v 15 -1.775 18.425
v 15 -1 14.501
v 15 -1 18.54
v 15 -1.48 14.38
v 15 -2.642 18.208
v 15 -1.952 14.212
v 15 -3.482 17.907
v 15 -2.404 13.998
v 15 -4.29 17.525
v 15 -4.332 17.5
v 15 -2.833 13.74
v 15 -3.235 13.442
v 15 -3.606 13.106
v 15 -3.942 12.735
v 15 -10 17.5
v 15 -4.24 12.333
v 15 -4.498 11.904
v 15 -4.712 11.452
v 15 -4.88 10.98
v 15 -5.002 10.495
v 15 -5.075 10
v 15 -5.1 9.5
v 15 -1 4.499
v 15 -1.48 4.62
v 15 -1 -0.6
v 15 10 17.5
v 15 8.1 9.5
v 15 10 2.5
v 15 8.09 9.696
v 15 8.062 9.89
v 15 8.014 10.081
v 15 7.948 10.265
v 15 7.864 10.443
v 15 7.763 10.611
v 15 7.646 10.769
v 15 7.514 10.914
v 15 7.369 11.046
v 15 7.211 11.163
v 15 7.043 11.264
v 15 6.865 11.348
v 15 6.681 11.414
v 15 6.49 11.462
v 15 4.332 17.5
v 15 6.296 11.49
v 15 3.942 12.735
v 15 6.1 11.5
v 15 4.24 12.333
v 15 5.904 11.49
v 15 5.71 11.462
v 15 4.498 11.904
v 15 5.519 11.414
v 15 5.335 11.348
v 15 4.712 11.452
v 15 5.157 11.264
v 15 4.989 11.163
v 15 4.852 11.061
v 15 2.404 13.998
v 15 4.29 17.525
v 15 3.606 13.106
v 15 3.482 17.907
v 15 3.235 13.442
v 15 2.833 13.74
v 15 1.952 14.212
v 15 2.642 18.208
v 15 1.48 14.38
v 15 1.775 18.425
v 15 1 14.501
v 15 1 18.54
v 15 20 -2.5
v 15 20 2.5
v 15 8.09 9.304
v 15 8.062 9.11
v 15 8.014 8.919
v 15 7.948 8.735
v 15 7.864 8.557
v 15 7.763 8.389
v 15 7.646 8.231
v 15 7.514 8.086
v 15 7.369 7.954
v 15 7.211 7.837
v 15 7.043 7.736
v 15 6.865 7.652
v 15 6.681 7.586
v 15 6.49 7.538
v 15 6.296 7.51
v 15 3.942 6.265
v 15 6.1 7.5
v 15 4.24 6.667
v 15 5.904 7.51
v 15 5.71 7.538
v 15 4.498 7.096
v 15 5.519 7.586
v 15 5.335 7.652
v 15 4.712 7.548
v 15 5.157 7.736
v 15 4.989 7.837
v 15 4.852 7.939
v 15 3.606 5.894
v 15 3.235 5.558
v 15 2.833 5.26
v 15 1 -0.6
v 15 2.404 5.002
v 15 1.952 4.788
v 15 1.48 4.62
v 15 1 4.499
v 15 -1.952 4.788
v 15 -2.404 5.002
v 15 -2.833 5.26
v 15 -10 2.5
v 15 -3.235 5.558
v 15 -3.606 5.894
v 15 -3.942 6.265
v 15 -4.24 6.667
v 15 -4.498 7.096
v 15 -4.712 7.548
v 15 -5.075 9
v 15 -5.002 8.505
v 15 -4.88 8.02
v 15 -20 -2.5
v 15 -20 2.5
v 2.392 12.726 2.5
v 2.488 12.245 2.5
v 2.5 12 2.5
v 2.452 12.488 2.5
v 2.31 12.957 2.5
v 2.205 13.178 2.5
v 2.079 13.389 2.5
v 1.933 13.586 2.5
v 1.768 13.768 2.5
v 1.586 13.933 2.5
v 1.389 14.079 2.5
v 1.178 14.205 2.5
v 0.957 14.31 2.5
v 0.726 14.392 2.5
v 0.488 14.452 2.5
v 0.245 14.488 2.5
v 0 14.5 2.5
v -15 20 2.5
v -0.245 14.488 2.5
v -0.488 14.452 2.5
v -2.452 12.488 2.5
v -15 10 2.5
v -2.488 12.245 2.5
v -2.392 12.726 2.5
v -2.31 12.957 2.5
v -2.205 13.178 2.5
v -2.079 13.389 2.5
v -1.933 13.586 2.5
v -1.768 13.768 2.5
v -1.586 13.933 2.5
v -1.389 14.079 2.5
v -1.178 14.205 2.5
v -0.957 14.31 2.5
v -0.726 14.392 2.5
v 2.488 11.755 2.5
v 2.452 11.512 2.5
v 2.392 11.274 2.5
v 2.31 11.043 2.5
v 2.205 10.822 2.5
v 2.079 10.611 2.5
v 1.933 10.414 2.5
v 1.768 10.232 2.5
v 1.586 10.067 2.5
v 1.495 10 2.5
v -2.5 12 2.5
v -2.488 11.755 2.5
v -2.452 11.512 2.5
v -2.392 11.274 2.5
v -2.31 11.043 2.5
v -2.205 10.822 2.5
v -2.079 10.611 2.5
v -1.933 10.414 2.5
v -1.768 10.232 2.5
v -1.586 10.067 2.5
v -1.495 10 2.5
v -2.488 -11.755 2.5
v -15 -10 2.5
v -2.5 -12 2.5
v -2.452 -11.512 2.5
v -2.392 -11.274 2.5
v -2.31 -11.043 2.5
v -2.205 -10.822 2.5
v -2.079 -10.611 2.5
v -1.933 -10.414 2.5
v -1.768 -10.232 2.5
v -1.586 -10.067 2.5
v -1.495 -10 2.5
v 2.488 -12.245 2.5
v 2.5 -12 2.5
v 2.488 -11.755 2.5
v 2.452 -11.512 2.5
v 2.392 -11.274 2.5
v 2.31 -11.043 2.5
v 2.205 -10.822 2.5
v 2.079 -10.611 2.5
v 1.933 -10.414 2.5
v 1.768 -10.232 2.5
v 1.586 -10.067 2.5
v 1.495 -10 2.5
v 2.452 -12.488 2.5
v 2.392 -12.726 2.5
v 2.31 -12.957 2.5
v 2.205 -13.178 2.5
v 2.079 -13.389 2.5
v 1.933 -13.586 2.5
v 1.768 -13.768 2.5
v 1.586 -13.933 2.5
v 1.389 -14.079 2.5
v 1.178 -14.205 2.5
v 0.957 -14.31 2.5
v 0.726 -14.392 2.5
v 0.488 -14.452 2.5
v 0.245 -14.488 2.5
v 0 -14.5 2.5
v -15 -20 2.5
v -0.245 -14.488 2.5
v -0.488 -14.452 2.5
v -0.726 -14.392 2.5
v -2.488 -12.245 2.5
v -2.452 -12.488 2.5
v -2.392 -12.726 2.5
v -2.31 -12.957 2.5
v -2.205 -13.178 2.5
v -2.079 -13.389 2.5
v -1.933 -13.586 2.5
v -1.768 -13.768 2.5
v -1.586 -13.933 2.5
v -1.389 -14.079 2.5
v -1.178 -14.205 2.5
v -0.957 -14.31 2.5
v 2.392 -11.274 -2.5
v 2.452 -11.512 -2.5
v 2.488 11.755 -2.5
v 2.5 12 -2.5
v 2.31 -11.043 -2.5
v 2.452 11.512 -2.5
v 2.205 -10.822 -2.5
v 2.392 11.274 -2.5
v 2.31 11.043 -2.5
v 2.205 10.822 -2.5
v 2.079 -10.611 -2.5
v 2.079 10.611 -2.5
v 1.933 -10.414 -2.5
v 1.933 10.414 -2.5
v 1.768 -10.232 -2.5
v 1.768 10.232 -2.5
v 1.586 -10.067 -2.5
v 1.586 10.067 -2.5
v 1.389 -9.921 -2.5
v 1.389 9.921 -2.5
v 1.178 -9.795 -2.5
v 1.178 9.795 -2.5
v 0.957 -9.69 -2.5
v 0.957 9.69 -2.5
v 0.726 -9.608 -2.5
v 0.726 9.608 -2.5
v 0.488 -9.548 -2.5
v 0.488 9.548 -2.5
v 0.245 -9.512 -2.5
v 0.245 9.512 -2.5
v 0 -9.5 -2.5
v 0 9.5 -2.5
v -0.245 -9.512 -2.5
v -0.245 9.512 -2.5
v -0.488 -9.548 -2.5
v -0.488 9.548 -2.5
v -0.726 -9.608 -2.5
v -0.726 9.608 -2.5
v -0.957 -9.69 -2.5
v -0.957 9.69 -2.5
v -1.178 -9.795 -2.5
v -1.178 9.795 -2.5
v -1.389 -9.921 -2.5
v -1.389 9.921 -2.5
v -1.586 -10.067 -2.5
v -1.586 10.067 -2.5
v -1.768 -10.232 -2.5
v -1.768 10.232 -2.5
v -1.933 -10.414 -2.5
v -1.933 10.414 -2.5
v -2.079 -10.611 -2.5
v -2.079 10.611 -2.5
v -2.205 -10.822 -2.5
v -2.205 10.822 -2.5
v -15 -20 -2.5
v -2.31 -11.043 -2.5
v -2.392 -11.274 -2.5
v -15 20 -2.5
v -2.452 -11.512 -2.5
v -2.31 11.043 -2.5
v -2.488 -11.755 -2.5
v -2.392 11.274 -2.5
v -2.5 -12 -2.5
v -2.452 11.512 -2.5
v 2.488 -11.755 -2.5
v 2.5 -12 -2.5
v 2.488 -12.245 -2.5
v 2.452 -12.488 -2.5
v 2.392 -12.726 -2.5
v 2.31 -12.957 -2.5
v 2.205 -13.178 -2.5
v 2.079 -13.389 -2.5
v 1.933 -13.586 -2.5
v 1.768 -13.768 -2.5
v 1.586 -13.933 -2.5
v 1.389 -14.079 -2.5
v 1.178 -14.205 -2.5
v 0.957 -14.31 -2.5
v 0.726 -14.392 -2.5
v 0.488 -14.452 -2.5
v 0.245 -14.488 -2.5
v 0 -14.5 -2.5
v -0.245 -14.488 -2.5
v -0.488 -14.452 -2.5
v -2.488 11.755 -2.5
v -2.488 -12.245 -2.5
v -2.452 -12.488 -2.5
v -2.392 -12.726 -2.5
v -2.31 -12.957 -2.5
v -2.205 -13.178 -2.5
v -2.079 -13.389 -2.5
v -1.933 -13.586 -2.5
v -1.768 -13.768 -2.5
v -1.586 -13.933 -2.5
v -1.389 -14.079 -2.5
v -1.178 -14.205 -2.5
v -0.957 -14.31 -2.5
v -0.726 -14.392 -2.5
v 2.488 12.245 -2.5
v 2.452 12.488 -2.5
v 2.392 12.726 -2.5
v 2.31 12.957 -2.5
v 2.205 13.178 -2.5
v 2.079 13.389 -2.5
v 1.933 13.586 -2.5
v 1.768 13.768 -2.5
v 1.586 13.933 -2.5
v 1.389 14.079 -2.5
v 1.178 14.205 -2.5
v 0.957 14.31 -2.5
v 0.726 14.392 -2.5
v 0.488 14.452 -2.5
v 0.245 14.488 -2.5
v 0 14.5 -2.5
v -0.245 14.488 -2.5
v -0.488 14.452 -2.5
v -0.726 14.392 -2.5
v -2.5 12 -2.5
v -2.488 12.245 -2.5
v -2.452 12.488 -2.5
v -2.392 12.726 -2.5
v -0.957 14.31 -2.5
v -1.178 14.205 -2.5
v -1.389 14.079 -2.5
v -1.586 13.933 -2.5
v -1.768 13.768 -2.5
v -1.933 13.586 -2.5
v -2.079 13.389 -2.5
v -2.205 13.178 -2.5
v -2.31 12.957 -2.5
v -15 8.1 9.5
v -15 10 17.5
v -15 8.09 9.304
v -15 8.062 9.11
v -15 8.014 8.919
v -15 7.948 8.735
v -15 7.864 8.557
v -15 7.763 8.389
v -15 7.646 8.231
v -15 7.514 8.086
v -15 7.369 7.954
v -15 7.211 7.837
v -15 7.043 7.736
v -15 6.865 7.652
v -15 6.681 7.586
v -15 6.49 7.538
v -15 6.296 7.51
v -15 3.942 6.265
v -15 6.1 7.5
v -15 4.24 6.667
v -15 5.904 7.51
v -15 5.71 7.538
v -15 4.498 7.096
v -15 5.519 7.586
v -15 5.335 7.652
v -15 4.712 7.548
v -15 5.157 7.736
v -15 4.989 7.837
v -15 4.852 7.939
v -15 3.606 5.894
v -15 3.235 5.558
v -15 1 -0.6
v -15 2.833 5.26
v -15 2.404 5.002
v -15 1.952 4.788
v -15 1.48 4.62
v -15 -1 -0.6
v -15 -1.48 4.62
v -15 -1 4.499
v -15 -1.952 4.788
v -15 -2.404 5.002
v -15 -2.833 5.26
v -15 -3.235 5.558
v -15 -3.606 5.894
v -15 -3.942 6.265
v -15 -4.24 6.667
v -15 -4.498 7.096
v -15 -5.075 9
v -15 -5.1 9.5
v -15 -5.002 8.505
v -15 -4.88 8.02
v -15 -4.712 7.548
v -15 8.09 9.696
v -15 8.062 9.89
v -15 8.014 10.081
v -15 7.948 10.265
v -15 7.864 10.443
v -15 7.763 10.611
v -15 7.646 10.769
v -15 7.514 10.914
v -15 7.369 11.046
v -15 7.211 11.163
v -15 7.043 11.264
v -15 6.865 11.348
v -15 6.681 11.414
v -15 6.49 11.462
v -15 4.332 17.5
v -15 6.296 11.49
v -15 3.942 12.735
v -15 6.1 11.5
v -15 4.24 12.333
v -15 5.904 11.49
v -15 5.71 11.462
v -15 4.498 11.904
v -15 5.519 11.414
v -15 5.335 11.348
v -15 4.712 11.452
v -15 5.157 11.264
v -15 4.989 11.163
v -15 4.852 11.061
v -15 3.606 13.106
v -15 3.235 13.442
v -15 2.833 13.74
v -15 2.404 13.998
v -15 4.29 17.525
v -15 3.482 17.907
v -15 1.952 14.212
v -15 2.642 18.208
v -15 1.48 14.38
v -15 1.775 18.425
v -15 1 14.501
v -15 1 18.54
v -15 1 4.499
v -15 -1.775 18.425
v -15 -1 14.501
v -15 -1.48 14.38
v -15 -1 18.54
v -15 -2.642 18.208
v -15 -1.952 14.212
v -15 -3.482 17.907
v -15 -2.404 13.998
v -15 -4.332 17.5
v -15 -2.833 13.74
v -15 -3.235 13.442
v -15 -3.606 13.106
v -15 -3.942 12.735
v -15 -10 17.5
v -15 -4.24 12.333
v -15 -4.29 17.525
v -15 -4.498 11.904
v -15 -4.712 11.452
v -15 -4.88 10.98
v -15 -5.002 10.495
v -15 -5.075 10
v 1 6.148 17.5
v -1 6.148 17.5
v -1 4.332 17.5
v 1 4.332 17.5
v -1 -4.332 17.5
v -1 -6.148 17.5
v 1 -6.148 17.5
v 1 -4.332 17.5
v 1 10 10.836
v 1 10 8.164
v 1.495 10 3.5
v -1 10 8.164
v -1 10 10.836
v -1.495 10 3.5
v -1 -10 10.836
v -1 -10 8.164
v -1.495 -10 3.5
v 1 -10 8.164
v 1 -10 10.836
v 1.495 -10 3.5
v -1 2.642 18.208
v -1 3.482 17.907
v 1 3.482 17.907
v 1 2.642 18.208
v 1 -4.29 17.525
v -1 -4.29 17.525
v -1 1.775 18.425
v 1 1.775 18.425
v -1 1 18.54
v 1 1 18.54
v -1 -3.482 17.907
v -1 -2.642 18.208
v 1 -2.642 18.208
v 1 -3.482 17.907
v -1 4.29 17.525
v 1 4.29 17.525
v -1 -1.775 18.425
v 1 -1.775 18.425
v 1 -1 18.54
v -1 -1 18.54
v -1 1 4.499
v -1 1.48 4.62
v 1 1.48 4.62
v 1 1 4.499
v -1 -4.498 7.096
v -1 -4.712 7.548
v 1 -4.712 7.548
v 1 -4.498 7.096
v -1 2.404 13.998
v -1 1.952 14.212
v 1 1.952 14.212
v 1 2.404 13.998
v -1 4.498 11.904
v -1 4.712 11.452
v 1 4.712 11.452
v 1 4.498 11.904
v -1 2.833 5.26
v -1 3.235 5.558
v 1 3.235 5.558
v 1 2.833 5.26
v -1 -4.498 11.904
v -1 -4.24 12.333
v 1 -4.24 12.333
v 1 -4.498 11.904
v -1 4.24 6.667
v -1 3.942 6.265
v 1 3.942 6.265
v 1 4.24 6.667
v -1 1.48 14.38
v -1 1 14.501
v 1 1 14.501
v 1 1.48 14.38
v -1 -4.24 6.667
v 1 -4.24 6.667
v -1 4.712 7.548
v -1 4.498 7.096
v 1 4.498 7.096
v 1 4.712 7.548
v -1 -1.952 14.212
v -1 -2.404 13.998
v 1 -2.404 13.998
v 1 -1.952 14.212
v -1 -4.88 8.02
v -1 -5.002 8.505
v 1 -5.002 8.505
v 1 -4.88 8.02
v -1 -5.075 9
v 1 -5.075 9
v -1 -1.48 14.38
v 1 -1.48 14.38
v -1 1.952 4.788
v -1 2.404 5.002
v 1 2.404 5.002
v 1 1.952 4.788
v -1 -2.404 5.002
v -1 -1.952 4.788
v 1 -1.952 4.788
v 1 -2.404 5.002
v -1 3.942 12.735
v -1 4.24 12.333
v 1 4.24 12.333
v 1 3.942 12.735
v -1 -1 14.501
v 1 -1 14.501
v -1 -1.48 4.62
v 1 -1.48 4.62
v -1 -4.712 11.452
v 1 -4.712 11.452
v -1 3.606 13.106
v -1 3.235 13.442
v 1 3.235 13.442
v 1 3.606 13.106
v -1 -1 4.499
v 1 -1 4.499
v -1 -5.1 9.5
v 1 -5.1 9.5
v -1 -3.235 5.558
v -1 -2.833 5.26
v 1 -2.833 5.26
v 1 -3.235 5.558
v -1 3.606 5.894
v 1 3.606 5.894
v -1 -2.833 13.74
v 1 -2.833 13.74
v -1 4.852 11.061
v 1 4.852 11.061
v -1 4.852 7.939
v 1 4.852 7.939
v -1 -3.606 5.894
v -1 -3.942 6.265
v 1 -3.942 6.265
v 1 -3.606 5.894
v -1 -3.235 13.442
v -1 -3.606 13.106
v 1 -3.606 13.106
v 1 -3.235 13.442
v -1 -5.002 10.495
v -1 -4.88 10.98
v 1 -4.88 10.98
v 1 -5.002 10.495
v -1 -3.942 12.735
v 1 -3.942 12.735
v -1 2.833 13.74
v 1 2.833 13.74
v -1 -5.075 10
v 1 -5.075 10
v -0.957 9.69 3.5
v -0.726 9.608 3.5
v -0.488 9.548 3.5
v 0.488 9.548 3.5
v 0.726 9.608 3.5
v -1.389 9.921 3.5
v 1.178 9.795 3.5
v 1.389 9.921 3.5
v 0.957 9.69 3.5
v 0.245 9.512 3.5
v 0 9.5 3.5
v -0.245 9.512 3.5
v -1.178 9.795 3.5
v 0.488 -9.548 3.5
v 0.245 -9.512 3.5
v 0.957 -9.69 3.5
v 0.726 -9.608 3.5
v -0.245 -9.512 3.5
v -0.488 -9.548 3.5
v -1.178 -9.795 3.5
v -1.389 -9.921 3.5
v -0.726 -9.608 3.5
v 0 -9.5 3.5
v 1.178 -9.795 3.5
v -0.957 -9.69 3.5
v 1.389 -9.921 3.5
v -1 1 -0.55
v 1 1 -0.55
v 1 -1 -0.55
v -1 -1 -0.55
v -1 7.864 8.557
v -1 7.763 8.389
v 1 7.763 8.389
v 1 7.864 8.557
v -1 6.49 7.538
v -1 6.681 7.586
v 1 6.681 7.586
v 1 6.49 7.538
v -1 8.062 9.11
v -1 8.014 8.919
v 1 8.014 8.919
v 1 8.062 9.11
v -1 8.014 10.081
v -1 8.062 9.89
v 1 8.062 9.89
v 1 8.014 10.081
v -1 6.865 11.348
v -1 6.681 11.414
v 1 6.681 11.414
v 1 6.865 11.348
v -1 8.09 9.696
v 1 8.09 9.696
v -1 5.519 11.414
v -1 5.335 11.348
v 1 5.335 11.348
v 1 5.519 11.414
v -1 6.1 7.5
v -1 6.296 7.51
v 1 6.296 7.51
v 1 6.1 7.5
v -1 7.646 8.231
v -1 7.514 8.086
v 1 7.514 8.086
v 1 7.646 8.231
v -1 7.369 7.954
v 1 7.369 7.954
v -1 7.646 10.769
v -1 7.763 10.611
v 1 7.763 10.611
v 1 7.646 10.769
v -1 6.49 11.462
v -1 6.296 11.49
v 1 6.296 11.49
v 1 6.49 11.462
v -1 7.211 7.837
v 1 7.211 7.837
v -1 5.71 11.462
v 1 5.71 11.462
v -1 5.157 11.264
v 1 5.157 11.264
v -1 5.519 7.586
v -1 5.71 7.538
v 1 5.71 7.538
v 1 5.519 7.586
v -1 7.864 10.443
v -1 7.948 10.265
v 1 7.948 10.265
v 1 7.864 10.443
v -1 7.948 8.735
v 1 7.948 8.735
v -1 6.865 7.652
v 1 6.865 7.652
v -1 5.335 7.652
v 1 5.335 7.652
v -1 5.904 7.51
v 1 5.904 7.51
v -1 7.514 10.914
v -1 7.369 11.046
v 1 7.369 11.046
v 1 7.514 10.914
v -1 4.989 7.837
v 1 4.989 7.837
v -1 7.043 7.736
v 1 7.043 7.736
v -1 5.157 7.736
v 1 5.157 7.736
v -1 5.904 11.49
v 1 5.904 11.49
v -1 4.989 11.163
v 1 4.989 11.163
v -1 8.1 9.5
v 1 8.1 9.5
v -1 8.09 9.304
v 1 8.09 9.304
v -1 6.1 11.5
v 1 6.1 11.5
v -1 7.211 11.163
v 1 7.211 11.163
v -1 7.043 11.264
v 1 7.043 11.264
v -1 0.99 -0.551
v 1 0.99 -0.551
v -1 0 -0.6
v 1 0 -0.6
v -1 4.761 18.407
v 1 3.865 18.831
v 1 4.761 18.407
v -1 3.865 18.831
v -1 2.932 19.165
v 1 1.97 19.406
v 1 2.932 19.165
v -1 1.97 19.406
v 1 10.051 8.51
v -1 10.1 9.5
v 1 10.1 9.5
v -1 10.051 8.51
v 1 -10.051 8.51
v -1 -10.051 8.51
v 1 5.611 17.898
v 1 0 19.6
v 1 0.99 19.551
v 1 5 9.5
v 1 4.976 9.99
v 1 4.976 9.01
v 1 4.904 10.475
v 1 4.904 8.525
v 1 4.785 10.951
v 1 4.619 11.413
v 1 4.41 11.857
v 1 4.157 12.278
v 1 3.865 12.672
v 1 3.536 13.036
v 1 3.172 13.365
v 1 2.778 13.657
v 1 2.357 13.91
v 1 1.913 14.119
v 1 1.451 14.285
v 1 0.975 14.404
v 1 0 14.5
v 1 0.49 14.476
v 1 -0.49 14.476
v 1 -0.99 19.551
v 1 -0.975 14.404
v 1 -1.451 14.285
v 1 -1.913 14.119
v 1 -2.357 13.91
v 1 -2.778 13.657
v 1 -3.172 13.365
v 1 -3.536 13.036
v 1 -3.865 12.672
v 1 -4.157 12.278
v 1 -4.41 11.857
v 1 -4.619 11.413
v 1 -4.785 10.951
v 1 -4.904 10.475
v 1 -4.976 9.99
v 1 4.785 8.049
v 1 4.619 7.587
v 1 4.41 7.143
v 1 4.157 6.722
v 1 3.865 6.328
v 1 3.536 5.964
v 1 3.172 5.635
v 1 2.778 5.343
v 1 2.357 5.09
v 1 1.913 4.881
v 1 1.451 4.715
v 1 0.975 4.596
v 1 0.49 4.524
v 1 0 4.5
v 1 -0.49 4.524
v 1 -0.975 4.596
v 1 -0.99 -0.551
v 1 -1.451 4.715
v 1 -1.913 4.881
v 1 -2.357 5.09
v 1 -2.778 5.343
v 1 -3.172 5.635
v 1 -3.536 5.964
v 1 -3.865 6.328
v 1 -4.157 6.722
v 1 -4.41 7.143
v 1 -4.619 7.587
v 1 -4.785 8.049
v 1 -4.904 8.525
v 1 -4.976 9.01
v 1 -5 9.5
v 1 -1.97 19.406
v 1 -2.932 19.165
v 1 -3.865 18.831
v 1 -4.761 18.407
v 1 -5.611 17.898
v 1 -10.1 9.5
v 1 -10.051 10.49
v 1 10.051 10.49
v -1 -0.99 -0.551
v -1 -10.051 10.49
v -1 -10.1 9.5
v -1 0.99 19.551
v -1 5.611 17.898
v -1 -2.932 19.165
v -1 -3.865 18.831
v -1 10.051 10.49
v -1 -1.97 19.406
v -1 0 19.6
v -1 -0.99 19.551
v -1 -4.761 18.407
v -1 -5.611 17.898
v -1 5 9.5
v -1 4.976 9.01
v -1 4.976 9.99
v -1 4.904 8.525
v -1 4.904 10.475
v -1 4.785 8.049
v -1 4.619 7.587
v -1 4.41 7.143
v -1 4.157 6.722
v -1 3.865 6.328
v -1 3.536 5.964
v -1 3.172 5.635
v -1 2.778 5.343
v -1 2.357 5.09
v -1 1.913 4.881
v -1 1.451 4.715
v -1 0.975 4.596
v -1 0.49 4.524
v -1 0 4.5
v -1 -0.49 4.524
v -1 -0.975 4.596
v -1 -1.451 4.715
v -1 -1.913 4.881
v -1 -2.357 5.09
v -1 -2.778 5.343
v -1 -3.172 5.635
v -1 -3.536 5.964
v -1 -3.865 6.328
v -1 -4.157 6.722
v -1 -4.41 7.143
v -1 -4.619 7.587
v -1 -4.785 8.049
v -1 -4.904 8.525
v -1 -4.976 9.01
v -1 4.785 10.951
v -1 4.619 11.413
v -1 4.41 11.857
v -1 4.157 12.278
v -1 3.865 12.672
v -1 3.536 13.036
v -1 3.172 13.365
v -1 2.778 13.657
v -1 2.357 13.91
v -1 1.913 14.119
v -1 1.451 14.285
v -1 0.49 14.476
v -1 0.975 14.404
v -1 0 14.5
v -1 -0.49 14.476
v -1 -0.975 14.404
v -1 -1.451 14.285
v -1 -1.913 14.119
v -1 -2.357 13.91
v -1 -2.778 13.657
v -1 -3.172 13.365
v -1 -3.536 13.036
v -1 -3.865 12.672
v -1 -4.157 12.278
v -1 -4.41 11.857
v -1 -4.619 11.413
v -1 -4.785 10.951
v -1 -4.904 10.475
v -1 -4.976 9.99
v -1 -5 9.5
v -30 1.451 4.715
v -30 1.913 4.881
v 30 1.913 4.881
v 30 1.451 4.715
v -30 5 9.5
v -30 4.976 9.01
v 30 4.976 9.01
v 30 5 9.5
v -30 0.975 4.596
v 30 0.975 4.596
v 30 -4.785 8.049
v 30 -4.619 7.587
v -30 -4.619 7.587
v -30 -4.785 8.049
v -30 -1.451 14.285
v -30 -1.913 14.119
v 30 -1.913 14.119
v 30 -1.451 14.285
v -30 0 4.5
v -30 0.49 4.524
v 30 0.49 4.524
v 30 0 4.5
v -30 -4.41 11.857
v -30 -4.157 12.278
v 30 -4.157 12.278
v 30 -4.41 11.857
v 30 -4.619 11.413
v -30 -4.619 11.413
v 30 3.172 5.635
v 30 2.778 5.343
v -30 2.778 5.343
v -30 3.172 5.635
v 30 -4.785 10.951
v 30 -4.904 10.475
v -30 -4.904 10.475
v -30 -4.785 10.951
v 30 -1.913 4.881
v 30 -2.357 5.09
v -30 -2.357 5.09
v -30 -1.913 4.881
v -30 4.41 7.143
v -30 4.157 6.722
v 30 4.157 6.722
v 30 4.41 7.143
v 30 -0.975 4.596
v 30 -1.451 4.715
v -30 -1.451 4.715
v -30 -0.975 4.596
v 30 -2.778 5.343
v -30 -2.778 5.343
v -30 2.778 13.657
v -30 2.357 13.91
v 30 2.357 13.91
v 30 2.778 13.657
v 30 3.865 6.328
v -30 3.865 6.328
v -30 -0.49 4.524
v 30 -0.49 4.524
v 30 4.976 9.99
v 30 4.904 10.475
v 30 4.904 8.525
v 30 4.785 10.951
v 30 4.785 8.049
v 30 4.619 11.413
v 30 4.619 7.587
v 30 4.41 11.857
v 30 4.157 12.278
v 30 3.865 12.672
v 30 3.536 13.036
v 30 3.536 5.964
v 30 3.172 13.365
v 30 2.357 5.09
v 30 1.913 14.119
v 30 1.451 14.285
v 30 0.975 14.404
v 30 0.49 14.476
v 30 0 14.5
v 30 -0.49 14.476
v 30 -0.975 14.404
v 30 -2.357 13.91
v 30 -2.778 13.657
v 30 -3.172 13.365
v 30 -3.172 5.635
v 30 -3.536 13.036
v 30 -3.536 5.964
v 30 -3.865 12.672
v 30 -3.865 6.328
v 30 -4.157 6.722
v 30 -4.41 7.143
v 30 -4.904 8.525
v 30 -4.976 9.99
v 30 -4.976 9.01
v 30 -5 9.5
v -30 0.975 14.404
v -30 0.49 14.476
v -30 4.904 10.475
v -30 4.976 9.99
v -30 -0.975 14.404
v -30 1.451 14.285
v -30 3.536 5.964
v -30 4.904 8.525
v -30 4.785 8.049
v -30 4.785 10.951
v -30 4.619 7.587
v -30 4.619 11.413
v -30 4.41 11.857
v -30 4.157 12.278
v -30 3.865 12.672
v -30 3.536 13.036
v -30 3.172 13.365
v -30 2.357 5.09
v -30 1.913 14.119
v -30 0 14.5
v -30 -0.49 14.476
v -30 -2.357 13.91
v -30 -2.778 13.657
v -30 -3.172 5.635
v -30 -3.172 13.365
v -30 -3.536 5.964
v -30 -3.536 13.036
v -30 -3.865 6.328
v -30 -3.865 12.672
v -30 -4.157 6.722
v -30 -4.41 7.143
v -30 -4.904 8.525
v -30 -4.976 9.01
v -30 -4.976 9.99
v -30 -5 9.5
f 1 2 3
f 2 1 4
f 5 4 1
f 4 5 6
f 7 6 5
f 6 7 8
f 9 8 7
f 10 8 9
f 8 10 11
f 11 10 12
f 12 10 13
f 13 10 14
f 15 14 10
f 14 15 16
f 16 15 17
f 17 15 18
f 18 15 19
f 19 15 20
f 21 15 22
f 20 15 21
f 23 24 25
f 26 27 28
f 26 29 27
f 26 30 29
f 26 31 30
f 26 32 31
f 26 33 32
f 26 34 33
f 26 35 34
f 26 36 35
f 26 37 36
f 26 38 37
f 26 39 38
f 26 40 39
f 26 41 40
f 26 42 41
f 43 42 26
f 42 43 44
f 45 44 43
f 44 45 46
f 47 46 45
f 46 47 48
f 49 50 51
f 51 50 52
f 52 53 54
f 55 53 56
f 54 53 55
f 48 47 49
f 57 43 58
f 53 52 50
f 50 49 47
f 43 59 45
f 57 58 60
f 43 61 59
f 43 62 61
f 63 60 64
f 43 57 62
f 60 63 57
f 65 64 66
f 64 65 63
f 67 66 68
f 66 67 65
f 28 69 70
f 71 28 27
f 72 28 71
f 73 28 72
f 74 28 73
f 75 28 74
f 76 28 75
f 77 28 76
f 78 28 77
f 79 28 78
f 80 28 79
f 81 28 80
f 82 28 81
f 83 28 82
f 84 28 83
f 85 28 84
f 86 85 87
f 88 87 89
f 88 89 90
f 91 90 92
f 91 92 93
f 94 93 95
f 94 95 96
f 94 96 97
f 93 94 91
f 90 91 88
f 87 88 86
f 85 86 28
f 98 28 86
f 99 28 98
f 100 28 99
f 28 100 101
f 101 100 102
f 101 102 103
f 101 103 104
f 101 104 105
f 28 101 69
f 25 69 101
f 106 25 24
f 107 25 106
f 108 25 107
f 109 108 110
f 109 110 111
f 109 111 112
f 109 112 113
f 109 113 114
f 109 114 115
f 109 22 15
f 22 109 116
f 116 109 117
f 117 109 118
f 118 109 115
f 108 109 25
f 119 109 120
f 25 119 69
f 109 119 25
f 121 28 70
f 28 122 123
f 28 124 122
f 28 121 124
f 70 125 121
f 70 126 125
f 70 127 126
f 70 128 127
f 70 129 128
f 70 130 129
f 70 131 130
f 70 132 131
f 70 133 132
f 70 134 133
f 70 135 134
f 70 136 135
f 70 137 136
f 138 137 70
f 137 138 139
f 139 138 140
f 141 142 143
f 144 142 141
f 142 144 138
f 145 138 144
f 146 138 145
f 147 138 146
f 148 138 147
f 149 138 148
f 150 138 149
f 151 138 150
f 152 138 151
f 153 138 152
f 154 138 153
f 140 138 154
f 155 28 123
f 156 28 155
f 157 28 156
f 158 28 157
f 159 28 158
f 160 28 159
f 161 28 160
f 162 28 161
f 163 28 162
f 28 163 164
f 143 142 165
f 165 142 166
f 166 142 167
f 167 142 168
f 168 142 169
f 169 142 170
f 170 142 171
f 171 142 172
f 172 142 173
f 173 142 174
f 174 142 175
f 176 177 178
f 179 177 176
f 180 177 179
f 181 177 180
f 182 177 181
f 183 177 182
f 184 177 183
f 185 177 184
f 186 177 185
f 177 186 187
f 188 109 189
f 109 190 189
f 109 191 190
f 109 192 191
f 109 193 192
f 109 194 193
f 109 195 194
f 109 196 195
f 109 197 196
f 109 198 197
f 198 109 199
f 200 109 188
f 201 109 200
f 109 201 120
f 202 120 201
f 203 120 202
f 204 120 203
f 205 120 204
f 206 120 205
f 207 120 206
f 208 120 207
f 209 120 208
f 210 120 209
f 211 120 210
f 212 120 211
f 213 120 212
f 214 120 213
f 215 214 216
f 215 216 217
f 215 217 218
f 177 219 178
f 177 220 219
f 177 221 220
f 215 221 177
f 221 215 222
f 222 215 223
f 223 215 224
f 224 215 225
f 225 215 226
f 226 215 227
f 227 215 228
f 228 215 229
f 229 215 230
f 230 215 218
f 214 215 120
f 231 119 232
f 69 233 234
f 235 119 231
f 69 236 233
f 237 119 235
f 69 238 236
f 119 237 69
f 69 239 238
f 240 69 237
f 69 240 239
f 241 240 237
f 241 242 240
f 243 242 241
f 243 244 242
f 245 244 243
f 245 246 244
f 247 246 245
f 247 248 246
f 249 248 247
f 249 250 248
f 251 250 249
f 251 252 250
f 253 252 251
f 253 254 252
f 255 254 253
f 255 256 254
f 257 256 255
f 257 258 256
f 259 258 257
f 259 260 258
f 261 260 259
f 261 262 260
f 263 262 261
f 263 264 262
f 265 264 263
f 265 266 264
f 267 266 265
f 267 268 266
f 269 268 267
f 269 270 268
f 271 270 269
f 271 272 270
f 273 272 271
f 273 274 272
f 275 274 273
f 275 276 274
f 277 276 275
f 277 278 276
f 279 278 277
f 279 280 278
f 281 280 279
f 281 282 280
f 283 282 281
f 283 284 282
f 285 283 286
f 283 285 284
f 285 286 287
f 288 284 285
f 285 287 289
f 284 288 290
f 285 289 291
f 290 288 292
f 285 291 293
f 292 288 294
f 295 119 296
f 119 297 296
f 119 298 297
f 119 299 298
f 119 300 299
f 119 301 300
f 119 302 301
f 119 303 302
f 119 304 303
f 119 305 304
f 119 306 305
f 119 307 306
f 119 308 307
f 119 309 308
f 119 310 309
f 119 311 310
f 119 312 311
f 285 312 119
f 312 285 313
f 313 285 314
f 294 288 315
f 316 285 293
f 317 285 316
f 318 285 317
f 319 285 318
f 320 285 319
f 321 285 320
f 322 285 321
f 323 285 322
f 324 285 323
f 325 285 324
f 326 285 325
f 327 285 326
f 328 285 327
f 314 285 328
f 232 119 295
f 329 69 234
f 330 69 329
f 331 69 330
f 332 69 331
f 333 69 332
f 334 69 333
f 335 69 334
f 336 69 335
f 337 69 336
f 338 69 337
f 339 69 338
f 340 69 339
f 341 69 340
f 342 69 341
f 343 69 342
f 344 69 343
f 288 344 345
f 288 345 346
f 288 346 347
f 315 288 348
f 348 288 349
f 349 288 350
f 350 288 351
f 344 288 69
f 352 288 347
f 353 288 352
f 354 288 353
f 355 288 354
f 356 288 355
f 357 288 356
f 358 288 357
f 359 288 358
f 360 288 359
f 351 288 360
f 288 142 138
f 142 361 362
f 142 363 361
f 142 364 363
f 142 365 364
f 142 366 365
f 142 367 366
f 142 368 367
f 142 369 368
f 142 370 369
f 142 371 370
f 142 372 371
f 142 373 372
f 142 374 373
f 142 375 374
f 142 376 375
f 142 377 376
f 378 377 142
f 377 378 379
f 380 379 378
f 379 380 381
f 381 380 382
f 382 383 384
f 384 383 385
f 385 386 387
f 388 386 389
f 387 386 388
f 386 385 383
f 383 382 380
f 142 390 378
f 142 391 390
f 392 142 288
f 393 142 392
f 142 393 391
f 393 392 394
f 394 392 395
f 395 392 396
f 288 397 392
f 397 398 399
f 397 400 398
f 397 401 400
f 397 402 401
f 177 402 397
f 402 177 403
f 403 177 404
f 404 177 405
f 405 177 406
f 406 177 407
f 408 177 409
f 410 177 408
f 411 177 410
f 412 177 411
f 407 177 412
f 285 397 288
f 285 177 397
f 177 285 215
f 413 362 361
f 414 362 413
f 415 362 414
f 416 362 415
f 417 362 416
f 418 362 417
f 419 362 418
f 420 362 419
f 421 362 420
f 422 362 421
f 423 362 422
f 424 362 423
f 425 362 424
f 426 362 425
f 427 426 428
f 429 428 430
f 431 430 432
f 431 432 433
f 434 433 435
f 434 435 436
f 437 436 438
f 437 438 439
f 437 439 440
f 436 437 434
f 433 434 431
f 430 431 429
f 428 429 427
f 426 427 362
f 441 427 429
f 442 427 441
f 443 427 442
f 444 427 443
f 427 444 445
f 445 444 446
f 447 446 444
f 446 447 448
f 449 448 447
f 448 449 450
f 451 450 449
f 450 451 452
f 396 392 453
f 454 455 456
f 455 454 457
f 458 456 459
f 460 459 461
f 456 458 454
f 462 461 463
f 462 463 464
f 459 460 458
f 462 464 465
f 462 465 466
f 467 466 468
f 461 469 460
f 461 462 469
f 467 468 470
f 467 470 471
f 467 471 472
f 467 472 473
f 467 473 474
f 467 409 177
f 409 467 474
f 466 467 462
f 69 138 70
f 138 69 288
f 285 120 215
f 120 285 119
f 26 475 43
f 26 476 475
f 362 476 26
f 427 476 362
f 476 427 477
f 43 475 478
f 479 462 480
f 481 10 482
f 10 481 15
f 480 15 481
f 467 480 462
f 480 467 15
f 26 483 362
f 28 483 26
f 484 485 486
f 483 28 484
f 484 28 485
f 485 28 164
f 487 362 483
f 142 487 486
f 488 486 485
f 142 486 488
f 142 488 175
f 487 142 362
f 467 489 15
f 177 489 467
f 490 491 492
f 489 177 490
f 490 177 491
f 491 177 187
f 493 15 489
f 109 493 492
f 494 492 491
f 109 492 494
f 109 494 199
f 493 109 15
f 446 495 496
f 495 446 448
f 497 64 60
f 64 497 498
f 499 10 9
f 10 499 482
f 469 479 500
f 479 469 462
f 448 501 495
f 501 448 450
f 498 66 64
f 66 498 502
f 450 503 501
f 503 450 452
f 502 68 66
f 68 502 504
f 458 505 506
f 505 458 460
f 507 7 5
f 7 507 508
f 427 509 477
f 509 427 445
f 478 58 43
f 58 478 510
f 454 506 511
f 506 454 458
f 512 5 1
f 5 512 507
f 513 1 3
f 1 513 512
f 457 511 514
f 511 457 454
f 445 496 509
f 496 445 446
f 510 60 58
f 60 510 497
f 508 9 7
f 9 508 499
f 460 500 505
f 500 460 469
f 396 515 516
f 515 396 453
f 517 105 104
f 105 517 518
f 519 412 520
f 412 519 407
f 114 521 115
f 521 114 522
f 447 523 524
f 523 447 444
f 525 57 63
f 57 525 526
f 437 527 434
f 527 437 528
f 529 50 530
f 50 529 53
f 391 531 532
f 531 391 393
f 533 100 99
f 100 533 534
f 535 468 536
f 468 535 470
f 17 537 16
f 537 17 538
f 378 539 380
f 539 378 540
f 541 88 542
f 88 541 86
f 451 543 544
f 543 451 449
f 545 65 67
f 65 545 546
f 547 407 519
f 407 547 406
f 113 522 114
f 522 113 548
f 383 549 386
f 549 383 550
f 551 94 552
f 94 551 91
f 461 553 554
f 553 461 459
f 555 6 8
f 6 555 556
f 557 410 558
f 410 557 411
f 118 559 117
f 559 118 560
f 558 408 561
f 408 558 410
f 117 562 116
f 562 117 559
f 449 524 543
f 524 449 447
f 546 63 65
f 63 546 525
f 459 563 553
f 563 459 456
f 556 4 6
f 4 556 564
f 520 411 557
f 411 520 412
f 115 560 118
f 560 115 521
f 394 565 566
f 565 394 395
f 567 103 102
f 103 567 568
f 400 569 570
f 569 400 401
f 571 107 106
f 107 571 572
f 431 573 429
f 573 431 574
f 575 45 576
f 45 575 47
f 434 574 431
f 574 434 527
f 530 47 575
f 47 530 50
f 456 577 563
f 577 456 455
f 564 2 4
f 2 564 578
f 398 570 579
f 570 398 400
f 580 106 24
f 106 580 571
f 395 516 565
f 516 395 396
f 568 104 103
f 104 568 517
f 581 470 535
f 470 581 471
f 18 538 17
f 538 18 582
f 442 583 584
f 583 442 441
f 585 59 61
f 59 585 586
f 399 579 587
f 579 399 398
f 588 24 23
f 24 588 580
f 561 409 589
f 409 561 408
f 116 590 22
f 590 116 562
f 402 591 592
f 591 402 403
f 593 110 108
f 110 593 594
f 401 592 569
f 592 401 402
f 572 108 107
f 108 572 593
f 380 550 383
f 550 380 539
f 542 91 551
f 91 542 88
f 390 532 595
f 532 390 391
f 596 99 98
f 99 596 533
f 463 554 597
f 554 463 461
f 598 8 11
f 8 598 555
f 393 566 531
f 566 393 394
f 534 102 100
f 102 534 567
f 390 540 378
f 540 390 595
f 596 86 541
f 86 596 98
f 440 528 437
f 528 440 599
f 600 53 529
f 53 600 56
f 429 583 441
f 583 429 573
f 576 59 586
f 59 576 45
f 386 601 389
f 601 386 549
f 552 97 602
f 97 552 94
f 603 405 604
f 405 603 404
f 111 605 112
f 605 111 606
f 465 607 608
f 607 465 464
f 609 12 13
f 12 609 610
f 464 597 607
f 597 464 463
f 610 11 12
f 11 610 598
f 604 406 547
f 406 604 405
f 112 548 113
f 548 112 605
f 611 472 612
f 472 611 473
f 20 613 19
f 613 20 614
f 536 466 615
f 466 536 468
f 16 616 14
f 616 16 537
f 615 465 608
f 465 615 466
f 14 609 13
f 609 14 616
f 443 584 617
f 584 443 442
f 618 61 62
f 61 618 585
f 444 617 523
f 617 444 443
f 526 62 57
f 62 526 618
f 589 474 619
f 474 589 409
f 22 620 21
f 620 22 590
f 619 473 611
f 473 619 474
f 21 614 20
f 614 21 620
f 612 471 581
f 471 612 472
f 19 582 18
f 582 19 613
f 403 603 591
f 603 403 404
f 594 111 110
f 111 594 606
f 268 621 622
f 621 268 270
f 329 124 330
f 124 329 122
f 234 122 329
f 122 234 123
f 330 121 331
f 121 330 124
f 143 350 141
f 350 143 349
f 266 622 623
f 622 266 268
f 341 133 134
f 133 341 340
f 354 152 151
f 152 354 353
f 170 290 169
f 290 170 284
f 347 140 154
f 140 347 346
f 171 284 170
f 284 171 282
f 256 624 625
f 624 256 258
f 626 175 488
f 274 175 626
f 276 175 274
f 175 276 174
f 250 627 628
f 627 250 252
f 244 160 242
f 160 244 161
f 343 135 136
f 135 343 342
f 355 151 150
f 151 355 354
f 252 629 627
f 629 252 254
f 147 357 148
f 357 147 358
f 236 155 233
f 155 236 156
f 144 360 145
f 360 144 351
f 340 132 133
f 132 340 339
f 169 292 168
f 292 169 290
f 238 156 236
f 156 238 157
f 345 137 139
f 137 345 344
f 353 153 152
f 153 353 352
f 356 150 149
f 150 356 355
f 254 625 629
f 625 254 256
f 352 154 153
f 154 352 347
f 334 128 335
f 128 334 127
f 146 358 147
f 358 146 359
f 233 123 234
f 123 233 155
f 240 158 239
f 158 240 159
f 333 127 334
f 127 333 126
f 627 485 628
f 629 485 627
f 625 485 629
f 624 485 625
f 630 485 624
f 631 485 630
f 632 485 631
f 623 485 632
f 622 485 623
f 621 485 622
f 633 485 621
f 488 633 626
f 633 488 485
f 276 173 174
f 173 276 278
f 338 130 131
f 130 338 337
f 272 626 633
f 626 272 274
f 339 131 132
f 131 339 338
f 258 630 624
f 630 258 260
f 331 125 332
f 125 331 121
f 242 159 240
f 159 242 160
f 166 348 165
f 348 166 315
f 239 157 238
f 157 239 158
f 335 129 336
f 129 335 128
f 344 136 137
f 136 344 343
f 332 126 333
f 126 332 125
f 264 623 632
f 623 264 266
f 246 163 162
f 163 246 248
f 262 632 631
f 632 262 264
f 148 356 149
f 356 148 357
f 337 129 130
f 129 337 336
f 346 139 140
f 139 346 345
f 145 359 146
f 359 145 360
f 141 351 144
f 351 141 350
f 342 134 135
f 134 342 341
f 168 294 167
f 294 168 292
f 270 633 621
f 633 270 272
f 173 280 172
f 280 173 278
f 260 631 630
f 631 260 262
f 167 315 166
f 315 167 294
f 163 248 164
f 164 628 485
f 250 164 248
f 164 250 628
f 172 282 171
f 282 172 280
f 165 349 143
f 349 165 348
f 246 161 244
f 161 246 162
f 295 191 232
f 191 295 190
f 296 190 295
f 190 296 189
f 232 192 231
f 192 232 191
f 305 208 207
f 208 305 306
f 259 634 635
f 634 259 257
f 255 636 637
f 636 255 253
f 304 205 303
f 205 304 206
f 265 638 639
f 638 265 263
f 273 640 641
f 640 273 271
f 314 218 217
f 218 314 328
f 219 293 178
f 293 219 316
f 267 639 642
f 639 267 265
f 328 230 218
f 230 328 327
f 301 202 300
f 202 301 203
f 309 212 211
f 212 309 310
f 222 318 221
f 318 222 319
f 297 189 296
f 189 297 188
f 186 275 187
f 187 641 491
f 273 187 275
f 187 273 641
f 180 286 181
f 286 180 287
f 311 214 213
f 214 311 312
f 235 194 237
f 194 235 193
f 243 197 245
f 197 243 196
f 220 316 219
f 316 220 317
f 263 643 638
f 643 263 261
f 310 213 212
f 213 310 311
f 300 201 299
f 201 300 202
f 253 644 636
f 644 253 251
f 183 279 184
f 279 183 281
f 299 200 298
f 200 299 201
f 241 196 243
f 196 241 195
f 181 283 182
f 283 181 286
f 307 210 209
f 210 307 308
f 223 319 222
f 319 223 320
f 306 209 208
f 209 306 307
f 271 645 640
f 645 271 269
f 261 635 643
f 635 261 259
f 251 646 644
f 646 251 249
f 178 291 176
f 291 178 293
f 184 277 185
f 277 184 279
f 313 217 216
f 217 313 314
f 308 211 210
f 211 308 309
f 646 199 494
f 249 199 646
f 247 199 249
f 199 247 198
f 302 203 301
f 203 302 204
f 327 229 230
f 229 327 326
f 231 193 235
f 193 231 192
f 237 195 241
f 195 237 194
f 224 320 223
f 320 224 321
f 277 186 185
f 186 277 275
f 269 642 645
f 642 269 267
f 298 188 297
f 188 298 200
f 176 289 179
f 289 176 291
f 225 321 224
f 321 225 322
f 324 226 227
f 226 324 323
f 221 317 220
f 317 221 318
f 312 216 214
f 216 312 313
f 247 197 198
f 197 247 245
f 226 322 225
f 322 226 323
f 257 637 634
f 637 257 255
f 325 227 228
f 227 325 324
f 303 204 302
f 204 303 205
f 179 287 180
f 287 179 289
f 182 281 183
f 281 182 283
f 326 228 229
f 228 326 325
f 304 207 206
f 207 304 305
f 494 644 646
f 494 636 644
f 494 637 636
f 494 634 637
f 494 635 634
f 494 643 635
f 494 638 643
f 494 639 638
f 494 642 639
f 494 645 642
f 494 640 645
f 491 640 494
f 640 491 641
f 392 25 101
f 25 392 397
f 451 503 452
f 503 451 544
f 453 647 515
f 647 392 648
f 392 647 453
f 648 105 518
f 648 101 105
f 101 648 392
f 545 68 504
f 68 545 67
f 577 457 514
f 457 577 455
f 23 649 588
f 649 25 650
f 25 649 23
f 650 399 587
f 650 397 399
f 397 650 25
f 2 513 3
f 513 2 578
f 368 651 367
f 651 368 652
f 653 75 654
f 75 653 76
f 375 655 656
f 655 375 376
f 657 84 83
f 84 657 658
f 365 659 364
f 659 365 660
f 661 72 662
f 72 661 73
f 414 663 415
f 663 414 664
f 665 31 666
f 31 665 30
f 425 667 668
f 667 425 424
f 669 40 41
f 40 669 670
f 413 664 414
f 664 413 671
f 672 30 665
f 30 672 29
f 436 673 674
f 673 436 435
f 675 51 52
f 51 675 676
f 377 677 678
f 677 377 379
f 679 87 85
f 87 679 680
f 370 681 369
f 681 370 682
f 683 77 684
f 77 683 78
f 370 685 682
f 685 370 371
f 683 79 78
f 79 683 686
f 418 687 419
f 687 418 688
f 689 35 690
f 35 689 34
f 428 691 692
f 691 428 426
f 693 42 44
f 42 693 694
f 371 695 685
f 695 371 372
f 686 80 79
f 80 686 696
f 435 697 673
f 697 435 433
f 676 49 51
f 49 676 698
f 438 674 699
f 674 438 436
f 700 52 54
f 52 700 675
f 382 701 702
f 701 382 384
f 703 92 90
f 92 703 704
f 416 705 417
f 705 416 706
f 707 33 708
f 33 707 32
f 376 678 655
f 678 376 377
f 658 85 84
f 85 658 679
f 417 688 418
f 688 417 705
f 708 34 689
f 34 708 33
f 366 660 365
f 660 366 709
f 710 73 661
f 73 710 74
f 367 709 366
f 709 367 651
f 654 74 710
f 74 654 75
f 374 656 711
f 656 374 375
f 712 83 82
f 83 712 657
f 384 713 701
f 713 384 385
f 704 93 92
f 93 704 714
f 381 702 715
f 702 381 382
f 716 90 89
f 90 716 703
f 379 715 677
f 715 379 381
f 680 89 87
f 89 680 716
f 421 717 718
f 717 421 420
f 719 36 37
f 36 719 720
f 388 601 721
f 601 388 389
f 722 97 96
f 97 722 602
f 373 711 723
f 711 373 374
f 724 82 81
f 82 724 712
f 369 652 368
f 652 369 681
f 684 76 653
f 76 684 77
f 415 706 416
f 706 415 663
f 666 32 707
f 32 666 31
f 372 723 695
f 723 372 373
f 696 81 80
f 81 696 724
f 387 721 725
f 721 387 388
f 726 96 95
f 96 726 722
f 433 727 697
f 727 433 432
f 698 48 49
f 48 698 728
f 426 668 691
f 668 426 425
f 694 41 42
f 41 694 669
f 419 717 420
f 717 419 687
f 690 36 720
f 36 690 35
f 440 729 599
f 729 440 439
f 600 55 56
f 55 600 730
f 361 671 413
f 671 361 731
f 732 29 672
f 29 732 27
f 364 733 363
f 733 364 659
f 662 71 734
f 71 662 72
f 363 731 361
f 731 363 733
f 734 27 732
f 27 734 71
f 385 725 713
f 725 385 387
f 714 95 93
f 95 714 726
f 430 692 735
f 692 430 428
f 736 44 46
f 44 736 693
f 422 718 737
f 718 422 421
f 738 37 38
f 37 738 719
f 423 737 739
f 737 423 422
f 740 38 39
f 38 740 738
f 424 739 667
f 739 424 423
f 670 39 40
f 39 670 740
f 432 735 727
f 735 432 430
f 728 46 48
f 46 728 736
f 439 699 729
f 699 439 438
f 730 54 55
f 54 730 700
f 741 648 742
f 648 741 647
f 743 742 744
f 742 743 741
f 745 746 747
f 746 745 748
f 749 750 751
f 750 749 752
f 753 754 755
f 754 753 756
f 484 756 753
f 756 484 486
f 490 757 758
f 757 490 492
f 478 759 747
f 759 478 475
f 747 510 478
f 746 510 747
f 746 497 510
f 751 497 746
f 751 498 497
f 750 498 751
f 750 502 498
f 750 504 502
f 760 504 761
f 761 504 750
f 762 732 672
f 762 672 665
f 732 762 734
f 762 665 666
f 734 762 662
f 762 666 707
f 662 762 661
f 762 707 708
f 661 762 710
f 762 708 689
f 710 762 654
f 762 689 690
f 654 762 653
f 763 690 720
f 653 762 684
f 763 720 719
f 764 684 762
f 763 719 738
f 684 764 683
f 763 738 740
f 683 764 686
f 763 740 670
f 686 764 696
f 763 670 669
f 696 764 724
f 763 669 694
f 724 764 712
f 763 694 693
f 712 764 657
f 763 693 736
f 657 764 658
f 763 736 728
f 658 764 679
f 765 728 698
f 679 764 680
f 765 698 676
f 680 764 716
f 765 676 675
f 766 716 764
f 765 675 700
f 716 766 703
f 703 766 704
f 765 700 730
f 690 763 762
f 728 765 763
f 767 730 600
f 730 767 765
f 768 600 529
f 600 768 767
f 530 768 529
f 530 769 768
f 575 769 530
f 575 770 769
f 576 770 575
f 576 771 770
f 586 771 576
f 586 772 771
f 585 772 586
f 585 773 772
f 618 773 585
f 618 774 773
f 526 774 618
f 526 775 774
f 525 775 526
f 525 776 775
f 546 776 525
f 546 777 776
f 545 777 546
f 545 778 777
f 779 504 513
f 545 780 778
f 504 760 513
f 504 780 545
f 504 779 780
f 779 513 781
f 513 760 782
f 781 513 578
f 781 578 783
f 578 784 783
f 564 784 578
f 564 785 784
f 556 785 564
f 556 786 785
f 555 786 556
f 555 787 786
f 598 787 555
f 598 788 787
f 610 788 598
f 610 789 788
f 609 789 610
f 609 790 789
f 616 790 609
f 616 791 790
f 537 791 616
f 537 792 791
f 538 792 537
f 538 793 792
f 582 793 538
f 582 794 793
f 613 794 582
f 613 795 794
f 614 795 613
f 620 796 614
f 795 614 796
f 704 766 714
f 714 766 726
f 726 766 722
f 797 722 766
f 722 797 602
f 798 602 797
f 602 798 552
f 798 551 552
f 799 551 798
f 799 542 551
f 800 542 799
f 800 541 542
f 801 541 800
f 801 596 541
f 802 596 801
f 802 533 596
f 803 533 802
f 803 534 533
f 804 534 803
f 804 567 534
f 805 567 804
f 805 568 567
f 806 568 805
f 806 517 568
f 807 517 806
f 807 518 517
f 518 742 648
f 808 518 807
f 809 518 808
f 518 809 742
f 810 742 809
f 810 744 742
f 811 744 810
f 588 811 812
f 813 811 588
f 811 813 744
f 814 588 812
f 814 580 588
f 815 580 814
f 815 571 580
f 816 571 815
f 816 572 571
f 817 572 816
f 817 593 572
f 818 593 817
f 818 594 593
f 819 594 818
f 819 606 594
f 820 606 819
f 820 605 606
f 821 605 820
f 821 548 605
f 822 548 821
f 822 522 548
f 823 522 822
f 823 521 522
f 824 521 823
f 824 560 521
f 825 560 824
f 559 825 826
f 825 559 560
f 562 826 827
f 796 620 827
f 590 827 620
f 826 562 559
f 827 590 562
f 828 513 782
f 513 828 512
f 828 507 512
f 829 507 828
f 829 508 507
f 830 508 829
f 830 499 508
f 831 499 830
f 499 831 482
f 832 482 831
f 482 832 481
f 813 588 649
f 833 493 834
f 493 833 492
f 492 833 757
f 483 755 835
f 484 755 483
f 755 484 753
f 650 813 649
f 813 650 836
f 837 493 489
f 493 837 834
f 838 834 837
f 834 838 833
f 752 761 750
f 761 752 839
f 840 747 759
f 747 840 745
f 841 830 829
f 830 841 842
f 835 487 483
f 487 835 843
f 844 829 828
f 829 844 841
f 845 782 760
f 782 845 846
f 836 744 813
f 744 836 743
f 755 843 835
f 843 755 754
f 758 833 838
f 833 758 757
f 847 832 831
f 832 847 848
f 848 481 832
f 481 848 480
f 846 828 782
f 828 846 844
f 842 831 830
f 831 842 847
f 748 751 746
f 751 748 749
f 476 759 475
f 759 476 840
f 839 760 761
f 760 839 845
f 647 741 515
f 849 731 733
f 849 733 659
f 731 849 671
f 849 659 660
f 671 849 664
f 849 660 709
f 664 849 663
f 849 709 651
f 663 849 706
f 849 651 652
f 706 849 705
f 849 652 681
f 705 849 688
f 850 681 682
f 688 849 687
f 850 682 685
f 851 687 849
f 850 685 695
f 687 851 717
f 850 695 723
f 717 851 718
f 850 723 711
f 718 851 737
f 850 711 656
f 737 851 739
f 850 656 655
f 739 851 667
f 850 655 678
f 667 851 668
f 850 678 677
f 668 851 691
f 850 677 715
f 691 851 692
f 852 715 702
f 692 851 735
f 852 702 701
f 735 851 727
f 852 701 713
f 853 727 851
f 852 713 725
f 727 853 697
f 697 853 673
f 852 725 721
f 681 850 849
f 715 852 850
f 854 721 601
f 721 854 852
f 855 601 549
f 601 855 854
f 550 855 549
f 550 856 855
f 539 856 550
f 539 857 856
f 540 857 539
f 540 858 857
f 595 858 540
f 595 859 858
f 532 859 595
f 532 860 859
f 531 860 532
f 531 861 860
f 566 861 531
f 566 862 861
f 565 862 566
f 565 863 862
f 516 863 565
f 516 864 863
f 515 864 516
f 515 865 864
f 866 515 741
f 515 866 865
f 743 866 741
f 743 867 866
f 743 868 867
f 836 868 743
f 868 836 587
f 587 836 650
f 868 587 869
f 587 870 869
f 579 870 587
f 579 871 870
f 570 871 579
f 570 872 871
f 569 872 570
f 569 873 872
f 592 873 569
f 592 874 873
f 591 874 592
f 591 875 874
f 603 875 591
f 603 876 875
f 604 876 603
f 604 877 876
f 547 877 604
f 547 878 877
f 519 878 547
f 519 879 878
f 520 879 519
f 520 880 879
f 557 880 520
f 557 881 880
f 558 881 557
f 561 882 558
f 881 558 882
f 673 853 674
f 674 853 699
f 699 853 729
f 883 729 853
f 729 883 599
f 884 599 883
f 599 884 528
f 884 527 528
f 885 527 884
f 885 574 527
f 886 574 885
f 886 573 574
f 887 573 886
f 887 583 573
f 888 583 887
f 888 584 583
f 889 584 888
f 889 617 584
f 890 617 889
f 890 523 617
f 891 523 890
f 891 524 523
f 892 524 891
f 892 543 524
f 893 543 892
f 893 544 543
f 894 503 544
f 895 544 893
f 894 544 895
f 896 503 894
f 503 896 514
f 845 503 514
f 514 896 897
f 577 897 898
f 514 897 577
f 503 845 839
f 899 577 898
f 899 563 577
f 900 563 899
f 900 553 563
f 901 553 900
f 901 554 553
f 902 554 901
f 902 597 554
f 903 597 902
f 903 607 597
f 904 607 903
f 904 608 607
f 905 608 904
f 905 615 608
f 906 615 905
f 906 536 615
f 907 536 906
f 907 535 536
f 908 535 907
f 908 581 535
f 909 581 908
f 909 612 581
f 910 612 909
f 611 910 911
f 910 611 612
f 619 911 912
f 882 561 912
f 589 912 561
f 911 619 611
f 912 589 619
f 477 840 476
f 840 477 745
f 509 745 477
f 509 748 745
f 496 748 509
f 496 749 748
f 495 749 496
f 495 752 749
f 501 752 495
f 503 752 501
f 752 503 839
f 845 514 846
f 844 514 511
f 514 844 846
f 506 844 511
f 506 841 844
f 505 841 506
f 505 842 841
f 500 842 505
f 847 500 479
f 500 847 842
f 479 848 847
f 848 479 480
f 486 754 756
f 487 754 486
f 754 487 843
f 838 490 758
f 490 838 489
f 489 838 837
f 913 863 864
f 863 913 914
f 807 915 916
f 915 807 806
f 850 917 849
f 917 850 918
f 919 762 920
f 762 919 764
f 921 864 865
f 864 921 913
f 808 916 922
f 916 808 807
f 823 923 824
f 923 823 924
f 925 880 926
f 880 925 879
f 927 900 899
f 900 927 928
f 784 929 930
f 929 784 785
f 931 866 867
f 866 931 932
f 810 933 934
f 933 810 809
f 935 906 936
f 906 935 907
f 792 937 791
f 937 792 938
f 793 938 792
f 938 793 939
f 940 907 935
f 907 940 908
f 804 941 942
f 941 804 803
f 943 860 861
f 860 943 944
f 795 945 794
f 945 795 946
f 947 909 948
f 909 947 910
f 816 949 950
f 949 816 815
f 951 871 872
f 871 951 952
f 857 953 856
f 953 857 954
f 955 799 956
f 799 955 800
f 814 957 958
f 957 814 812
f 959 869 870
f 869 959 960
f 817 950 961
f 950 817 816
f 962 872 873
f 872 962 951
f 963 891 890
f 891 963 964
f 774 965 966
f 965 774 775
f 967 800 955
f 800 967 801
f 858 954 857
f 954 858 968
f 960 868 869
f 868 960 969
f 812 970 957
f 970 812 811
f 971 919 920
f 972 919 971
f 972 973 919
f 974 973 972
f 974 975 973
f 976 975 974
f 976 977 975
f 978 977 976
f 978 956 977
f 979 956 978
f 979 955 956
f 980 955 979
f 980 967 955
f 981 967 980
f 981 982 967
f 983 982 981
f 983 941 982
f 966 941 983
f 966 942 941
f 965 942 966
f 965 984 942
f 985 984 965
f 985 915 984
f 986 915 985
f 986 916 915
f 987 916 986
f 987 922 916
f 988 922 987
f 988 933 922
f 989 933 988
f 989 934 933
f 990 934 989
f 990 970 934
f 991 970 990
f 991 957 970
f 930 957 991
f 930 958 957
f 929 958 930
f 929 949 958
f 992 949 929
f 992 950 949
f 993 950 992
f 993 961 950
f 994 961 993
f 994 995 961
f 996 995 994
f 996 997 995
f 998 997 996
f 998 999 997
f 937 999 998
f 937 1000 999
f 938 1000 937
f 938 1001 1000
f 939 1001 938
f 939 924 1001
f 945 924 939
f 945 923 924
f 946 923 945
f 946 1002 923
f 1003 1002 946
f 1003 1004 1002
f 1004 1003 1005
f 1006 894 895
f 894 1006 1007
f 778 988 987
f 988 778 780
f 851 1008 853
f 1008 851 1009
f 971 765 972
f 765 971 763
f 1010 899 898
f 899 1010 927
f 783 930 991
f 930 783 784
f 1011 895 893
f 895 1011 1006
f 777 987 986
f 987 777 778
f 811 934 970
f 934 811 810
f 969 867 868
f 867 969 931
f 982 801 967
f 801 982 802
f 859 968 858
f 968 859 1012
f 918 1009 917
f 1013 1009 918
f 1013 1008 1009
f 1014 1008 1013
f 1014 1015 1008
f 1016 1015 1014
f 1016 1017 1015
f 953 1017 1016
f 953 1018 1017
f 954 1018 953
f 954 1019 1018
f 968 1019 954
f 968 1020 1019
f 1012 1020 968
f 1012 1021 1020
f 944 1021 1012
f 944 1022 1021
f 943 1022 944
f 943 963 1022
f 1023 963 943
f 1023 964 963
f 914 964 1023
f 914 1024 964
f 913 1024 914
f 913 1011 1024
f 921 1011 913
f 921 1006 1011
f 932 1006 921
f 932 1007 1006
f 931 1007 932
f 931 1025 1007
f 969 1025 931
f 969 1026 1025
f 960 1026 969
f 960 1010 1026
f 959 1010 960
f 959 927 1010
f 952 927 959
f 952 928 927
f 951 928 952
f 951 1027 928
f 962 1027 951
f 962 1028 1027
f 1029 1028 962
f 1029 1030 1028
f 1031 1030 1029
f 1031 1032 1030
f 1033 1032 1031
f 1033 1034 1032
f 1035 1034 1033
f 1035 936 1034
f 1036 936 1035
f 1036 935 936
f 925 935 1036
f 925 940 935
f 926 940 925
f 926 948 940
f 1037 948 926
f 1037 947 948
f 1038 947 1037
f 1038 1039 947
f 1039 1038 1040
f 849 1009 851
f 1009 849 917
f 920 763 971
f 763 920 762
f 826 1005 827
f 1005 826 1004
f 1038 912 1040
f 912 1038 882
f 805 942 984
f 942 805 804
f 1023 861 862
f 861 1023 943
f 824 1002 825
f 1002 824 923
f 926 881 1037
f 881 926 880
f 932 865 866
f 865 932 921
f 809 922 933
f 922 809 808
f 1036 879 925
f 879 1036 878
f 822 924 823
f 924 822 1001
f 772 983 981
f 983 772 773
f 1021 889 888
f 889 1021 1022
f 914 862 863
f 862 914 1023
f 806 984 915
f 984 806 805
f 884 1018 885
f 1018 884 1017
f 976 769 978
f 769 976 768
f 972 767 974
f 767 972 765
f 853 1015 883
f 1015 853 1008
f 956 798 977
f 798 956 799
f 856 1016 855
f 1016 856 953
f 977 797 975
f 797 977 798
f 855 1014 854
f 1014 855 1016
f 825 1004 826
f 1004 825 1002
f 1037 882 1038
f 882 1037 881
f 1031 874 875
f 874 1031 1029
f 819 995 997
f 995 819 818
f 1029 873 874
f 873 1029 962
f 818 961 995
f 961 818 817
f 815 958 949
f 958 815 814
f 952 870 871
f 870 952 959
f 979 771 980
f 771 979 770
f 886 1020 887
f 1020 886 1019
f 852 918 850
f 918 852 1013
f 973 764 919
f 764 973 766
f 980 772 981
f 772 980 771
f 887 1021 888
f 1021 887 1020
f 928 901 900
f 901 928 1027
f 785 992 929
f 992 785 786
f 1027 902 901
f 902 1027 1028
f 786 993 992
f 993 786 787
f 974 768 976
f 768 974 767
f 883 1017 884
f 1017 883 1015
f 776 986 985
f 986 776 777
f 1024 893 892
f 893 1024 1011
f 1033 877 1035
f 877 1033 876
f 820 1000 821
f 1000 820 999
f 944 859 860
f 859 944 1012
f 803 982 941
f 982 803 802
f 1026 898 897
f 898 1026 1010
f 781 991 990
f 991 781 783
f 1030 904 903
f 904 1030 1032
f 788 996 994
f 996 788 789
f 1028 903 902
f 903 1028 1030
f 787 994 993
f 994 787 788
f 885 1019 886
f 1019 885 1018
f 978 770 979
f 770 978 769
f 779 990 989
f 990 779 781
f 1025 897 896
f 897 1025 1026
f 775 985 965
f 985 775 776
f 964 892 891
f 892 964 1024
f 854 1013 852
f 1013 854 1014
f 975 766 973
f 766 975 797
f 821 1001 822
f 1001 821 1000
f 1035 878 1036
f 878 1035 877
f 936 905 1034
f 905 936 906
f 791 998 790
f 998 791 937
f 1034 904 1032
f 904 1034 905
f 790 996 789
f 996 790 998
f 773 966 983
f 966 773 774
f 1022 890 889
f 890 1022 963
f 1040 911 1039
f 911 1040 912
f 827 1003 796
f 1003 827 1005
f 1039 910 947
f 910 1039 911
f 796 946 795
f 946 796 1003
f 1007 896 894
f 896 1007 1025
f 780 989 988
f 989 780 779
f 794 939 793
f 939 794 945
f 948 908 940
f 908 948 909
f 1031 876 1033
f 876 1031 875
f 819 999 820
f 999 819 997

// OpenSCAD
// Parameters
rod_diameter = 10.0; //[5.0:20.0:0.1]
rod_length = 60.0; //[30.0:120.0:1]
bracket_height = 20.0; //[10.0:40.0:0.5]
rod_clearance = 0.2; //[0.0:0.6:0.05]
wall_thickness = 4.0; //[2.0:8.0:0.5]
base_thickness = 5.0; //[2.5:10.0:0.5]
base_width = 30.0; //[15.0:60.0:1]
base_length = 40.0; //[20.0:80.0:1]
mount_hole_diameter = 5.0; //[3.0:8.0:0.1]
mount_hole_spacing = 24.0; //[12.0:48.0:1]
clamp_gap = 2.0; //[0.5:5.0:0.5]
clamp_bolt_hole_diameter = 4.0; //[2.0:6.0:0.1]
overlap = 1.0; //[0.5:2.0:0.1]

// Derived placement (recalculated to guarantee contact/overlap)
rod_outer_d = rod_diameter + rod_clearance + 2*wall_thickness;

// Place rod axis so collar sits within bracket height and intersects the support body.
// Keep the collar centered within the upper body region.
upper_body_h = max(0.01, bracket_height - base_thickness + overlap);
upper_body_center_z = base_thickness/2 + upper_body_h/2 - overlap;
rod_center_z = upper_body_center_z;  // ensures collar intersects the upper body

// Rod - solid geometry (used as "shaft" in the assembly)
module rod_solid() {
  // Along X after rotation in assembly
  cylinder(r=rod_diameter/2, h=rod_length, center=true, $fn=64);
}

// Bracket - solid geometry (with bore and features removed)
module bracket_solid() {
  difference() {
    union() {
      // Mounting base
      cube([base_width, base_length, base_thickness], center=true);

      // Support body (overlaps base by 'overlap' to ensure fusion)
      translate([0, 0, upper_body_center_z])
        cube([base_width, base_length/2, upper_body_h], center=true);

      // Support collar outer (centered on rod axis) - MUST intersect support body
      translate([0, 0, rod_center_z])
        rotate([0, 90, 0])
          cylinder(r=rod_outer_d/2, h=base_width, center=true, $fn=64);
    }

    // Rod seat / bore (slightly longer to fully cut through collar)
    translate([0, 0, rod_center_z])
      rotate([0, 90, 0])
        cylinder(r=(rod_diameter + rod_clearance)/2, h=base_width + 2*overlap, center=true, $fn=64);

    // Mounting holes
    translate([0,  mount_hole_spacing/2, 0])
      cylinder(r=mount_hole_diameter/2, h=base_thickness + 2*overlap, center=true, $fn=64);
    translate([0, -mount_hole_spacing/2, 0])
      cylinder(r=mount_hole_diameter/2, h=base_thickness + 2*overlap, center=true, $fn=64);

    // Clamp split
    translate([0, 0, rod_center_z])
      cube([base_width + 2*overlap, clamp_gap, rod_outer_d + 2*overlap], center=true);

    // Clamp bolt hole
    translate([0,
               rod_outer_d/2 - clamp_gap/2 - clamp_bolt_hole_diameter/2,
               rod_center_z])
      rotate([0, 90, 0])
        cylinder(r=clamp_bolt_hole_diameter/2, h=base_width + 2*overlap, center=true, $fn=64);
  }
}

// Assembly: single connected solid.
// Fixes:
// - Rod is no longer a separate floating body: it is physically fused to the bracket
//   via a small external "weld collar" that overlaps BOTH the rod and the bracket by 1-2mm.
// - All parts are combined with union().
module assembly() {
  union() {
    bracket_solid();

    // Shaft positioned through the bracket (same axis as bore)
    translate([0, 0, rod_center_z])
      rotate([0, 90, 0])
        rod_solid();

    // External weld collar (adds minimal geometry) to guarantee fusion:
    // - Inner radius slightly smaller than rod radius => overlaps rod
    // - Outer radius slightly larger than bracket collar radius => overlaps bracket
    // - Short length (2*overlap) centered on bracket => overlaps bracket material
    translate([0, 0, rod_center_z])
      rotate([0, 90, 0])
        difference() {
          cylinder(r=rod_outer_d/2 + overlap, h=2*overlap, center=true, $fn=64);
          cylinder(r=rod_diameter/2 - overlap, h=2*overlap + 0.2, center=true, $fn=64);
        }
  }
}

assembly();
